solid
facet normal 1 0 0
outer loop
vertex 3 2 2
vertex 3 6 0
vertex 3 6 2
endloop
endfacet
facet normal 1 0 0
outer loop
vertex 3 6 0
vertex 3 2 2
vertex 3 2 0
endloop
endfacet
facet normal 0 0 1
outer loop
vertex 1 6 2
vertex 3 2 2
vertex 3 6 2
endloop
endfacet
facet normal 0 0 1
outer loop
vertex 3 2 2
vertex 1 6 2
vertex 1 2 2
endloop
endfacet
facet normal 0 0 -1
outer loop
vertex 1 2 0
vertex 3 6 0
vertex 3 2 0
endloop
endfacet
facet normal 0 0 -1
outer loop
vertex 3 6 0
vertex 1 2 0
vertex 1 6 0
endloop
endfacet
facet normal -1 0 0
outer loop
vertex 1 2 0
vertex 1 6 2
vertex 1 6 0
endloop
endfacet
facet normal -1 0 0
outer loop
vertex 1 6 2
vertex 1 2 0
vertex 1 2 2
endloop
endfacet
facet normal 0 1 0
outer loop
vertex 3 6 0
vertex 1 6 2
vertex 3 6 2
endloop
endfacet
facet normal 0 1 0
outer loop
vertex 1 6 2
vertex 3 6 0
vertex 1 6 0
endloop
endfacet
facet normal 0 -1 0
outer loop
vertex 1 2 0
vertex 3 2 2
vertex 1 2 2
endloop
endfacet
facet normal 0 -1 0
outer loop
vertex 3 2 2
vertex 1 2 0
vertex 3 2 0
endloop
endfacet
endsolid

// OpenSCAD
module shim() {
    polyhedron(
  points=[ 
  [0,0,0],   // 0
  [4,0,0],  // 1
  [1, 2, 0], // 2
  [3,2,0],  // 3
  [1,2,2], // 4
  [3,2,2], // 5
  [0,0,3],
  [4,0,3]

  ],                                  
  faces=[ 
    [0,1,2], [1,2,3], // bottom
    [2,3,4], [3,4,5],  // face
    [4,6,7], [4,5,7], // pitch
    [0,1,7], [0,6,7],  // back
    [0,2,4], [0,4,6], // left
    [1,3,5], [1,5,7] // right
    ]                         
 );
 
 }
 
 shim();
 translate([1,2,0]) cube ([2,4,2]);
 mirror ([0,1,0]) translate([0,-8,0]) shim(); 
 
 

 
   //faces=[ [0,1,4],[1,2,4],[2,3,4],[3,0,4],[1,0,3],[2,1,3] ]  
